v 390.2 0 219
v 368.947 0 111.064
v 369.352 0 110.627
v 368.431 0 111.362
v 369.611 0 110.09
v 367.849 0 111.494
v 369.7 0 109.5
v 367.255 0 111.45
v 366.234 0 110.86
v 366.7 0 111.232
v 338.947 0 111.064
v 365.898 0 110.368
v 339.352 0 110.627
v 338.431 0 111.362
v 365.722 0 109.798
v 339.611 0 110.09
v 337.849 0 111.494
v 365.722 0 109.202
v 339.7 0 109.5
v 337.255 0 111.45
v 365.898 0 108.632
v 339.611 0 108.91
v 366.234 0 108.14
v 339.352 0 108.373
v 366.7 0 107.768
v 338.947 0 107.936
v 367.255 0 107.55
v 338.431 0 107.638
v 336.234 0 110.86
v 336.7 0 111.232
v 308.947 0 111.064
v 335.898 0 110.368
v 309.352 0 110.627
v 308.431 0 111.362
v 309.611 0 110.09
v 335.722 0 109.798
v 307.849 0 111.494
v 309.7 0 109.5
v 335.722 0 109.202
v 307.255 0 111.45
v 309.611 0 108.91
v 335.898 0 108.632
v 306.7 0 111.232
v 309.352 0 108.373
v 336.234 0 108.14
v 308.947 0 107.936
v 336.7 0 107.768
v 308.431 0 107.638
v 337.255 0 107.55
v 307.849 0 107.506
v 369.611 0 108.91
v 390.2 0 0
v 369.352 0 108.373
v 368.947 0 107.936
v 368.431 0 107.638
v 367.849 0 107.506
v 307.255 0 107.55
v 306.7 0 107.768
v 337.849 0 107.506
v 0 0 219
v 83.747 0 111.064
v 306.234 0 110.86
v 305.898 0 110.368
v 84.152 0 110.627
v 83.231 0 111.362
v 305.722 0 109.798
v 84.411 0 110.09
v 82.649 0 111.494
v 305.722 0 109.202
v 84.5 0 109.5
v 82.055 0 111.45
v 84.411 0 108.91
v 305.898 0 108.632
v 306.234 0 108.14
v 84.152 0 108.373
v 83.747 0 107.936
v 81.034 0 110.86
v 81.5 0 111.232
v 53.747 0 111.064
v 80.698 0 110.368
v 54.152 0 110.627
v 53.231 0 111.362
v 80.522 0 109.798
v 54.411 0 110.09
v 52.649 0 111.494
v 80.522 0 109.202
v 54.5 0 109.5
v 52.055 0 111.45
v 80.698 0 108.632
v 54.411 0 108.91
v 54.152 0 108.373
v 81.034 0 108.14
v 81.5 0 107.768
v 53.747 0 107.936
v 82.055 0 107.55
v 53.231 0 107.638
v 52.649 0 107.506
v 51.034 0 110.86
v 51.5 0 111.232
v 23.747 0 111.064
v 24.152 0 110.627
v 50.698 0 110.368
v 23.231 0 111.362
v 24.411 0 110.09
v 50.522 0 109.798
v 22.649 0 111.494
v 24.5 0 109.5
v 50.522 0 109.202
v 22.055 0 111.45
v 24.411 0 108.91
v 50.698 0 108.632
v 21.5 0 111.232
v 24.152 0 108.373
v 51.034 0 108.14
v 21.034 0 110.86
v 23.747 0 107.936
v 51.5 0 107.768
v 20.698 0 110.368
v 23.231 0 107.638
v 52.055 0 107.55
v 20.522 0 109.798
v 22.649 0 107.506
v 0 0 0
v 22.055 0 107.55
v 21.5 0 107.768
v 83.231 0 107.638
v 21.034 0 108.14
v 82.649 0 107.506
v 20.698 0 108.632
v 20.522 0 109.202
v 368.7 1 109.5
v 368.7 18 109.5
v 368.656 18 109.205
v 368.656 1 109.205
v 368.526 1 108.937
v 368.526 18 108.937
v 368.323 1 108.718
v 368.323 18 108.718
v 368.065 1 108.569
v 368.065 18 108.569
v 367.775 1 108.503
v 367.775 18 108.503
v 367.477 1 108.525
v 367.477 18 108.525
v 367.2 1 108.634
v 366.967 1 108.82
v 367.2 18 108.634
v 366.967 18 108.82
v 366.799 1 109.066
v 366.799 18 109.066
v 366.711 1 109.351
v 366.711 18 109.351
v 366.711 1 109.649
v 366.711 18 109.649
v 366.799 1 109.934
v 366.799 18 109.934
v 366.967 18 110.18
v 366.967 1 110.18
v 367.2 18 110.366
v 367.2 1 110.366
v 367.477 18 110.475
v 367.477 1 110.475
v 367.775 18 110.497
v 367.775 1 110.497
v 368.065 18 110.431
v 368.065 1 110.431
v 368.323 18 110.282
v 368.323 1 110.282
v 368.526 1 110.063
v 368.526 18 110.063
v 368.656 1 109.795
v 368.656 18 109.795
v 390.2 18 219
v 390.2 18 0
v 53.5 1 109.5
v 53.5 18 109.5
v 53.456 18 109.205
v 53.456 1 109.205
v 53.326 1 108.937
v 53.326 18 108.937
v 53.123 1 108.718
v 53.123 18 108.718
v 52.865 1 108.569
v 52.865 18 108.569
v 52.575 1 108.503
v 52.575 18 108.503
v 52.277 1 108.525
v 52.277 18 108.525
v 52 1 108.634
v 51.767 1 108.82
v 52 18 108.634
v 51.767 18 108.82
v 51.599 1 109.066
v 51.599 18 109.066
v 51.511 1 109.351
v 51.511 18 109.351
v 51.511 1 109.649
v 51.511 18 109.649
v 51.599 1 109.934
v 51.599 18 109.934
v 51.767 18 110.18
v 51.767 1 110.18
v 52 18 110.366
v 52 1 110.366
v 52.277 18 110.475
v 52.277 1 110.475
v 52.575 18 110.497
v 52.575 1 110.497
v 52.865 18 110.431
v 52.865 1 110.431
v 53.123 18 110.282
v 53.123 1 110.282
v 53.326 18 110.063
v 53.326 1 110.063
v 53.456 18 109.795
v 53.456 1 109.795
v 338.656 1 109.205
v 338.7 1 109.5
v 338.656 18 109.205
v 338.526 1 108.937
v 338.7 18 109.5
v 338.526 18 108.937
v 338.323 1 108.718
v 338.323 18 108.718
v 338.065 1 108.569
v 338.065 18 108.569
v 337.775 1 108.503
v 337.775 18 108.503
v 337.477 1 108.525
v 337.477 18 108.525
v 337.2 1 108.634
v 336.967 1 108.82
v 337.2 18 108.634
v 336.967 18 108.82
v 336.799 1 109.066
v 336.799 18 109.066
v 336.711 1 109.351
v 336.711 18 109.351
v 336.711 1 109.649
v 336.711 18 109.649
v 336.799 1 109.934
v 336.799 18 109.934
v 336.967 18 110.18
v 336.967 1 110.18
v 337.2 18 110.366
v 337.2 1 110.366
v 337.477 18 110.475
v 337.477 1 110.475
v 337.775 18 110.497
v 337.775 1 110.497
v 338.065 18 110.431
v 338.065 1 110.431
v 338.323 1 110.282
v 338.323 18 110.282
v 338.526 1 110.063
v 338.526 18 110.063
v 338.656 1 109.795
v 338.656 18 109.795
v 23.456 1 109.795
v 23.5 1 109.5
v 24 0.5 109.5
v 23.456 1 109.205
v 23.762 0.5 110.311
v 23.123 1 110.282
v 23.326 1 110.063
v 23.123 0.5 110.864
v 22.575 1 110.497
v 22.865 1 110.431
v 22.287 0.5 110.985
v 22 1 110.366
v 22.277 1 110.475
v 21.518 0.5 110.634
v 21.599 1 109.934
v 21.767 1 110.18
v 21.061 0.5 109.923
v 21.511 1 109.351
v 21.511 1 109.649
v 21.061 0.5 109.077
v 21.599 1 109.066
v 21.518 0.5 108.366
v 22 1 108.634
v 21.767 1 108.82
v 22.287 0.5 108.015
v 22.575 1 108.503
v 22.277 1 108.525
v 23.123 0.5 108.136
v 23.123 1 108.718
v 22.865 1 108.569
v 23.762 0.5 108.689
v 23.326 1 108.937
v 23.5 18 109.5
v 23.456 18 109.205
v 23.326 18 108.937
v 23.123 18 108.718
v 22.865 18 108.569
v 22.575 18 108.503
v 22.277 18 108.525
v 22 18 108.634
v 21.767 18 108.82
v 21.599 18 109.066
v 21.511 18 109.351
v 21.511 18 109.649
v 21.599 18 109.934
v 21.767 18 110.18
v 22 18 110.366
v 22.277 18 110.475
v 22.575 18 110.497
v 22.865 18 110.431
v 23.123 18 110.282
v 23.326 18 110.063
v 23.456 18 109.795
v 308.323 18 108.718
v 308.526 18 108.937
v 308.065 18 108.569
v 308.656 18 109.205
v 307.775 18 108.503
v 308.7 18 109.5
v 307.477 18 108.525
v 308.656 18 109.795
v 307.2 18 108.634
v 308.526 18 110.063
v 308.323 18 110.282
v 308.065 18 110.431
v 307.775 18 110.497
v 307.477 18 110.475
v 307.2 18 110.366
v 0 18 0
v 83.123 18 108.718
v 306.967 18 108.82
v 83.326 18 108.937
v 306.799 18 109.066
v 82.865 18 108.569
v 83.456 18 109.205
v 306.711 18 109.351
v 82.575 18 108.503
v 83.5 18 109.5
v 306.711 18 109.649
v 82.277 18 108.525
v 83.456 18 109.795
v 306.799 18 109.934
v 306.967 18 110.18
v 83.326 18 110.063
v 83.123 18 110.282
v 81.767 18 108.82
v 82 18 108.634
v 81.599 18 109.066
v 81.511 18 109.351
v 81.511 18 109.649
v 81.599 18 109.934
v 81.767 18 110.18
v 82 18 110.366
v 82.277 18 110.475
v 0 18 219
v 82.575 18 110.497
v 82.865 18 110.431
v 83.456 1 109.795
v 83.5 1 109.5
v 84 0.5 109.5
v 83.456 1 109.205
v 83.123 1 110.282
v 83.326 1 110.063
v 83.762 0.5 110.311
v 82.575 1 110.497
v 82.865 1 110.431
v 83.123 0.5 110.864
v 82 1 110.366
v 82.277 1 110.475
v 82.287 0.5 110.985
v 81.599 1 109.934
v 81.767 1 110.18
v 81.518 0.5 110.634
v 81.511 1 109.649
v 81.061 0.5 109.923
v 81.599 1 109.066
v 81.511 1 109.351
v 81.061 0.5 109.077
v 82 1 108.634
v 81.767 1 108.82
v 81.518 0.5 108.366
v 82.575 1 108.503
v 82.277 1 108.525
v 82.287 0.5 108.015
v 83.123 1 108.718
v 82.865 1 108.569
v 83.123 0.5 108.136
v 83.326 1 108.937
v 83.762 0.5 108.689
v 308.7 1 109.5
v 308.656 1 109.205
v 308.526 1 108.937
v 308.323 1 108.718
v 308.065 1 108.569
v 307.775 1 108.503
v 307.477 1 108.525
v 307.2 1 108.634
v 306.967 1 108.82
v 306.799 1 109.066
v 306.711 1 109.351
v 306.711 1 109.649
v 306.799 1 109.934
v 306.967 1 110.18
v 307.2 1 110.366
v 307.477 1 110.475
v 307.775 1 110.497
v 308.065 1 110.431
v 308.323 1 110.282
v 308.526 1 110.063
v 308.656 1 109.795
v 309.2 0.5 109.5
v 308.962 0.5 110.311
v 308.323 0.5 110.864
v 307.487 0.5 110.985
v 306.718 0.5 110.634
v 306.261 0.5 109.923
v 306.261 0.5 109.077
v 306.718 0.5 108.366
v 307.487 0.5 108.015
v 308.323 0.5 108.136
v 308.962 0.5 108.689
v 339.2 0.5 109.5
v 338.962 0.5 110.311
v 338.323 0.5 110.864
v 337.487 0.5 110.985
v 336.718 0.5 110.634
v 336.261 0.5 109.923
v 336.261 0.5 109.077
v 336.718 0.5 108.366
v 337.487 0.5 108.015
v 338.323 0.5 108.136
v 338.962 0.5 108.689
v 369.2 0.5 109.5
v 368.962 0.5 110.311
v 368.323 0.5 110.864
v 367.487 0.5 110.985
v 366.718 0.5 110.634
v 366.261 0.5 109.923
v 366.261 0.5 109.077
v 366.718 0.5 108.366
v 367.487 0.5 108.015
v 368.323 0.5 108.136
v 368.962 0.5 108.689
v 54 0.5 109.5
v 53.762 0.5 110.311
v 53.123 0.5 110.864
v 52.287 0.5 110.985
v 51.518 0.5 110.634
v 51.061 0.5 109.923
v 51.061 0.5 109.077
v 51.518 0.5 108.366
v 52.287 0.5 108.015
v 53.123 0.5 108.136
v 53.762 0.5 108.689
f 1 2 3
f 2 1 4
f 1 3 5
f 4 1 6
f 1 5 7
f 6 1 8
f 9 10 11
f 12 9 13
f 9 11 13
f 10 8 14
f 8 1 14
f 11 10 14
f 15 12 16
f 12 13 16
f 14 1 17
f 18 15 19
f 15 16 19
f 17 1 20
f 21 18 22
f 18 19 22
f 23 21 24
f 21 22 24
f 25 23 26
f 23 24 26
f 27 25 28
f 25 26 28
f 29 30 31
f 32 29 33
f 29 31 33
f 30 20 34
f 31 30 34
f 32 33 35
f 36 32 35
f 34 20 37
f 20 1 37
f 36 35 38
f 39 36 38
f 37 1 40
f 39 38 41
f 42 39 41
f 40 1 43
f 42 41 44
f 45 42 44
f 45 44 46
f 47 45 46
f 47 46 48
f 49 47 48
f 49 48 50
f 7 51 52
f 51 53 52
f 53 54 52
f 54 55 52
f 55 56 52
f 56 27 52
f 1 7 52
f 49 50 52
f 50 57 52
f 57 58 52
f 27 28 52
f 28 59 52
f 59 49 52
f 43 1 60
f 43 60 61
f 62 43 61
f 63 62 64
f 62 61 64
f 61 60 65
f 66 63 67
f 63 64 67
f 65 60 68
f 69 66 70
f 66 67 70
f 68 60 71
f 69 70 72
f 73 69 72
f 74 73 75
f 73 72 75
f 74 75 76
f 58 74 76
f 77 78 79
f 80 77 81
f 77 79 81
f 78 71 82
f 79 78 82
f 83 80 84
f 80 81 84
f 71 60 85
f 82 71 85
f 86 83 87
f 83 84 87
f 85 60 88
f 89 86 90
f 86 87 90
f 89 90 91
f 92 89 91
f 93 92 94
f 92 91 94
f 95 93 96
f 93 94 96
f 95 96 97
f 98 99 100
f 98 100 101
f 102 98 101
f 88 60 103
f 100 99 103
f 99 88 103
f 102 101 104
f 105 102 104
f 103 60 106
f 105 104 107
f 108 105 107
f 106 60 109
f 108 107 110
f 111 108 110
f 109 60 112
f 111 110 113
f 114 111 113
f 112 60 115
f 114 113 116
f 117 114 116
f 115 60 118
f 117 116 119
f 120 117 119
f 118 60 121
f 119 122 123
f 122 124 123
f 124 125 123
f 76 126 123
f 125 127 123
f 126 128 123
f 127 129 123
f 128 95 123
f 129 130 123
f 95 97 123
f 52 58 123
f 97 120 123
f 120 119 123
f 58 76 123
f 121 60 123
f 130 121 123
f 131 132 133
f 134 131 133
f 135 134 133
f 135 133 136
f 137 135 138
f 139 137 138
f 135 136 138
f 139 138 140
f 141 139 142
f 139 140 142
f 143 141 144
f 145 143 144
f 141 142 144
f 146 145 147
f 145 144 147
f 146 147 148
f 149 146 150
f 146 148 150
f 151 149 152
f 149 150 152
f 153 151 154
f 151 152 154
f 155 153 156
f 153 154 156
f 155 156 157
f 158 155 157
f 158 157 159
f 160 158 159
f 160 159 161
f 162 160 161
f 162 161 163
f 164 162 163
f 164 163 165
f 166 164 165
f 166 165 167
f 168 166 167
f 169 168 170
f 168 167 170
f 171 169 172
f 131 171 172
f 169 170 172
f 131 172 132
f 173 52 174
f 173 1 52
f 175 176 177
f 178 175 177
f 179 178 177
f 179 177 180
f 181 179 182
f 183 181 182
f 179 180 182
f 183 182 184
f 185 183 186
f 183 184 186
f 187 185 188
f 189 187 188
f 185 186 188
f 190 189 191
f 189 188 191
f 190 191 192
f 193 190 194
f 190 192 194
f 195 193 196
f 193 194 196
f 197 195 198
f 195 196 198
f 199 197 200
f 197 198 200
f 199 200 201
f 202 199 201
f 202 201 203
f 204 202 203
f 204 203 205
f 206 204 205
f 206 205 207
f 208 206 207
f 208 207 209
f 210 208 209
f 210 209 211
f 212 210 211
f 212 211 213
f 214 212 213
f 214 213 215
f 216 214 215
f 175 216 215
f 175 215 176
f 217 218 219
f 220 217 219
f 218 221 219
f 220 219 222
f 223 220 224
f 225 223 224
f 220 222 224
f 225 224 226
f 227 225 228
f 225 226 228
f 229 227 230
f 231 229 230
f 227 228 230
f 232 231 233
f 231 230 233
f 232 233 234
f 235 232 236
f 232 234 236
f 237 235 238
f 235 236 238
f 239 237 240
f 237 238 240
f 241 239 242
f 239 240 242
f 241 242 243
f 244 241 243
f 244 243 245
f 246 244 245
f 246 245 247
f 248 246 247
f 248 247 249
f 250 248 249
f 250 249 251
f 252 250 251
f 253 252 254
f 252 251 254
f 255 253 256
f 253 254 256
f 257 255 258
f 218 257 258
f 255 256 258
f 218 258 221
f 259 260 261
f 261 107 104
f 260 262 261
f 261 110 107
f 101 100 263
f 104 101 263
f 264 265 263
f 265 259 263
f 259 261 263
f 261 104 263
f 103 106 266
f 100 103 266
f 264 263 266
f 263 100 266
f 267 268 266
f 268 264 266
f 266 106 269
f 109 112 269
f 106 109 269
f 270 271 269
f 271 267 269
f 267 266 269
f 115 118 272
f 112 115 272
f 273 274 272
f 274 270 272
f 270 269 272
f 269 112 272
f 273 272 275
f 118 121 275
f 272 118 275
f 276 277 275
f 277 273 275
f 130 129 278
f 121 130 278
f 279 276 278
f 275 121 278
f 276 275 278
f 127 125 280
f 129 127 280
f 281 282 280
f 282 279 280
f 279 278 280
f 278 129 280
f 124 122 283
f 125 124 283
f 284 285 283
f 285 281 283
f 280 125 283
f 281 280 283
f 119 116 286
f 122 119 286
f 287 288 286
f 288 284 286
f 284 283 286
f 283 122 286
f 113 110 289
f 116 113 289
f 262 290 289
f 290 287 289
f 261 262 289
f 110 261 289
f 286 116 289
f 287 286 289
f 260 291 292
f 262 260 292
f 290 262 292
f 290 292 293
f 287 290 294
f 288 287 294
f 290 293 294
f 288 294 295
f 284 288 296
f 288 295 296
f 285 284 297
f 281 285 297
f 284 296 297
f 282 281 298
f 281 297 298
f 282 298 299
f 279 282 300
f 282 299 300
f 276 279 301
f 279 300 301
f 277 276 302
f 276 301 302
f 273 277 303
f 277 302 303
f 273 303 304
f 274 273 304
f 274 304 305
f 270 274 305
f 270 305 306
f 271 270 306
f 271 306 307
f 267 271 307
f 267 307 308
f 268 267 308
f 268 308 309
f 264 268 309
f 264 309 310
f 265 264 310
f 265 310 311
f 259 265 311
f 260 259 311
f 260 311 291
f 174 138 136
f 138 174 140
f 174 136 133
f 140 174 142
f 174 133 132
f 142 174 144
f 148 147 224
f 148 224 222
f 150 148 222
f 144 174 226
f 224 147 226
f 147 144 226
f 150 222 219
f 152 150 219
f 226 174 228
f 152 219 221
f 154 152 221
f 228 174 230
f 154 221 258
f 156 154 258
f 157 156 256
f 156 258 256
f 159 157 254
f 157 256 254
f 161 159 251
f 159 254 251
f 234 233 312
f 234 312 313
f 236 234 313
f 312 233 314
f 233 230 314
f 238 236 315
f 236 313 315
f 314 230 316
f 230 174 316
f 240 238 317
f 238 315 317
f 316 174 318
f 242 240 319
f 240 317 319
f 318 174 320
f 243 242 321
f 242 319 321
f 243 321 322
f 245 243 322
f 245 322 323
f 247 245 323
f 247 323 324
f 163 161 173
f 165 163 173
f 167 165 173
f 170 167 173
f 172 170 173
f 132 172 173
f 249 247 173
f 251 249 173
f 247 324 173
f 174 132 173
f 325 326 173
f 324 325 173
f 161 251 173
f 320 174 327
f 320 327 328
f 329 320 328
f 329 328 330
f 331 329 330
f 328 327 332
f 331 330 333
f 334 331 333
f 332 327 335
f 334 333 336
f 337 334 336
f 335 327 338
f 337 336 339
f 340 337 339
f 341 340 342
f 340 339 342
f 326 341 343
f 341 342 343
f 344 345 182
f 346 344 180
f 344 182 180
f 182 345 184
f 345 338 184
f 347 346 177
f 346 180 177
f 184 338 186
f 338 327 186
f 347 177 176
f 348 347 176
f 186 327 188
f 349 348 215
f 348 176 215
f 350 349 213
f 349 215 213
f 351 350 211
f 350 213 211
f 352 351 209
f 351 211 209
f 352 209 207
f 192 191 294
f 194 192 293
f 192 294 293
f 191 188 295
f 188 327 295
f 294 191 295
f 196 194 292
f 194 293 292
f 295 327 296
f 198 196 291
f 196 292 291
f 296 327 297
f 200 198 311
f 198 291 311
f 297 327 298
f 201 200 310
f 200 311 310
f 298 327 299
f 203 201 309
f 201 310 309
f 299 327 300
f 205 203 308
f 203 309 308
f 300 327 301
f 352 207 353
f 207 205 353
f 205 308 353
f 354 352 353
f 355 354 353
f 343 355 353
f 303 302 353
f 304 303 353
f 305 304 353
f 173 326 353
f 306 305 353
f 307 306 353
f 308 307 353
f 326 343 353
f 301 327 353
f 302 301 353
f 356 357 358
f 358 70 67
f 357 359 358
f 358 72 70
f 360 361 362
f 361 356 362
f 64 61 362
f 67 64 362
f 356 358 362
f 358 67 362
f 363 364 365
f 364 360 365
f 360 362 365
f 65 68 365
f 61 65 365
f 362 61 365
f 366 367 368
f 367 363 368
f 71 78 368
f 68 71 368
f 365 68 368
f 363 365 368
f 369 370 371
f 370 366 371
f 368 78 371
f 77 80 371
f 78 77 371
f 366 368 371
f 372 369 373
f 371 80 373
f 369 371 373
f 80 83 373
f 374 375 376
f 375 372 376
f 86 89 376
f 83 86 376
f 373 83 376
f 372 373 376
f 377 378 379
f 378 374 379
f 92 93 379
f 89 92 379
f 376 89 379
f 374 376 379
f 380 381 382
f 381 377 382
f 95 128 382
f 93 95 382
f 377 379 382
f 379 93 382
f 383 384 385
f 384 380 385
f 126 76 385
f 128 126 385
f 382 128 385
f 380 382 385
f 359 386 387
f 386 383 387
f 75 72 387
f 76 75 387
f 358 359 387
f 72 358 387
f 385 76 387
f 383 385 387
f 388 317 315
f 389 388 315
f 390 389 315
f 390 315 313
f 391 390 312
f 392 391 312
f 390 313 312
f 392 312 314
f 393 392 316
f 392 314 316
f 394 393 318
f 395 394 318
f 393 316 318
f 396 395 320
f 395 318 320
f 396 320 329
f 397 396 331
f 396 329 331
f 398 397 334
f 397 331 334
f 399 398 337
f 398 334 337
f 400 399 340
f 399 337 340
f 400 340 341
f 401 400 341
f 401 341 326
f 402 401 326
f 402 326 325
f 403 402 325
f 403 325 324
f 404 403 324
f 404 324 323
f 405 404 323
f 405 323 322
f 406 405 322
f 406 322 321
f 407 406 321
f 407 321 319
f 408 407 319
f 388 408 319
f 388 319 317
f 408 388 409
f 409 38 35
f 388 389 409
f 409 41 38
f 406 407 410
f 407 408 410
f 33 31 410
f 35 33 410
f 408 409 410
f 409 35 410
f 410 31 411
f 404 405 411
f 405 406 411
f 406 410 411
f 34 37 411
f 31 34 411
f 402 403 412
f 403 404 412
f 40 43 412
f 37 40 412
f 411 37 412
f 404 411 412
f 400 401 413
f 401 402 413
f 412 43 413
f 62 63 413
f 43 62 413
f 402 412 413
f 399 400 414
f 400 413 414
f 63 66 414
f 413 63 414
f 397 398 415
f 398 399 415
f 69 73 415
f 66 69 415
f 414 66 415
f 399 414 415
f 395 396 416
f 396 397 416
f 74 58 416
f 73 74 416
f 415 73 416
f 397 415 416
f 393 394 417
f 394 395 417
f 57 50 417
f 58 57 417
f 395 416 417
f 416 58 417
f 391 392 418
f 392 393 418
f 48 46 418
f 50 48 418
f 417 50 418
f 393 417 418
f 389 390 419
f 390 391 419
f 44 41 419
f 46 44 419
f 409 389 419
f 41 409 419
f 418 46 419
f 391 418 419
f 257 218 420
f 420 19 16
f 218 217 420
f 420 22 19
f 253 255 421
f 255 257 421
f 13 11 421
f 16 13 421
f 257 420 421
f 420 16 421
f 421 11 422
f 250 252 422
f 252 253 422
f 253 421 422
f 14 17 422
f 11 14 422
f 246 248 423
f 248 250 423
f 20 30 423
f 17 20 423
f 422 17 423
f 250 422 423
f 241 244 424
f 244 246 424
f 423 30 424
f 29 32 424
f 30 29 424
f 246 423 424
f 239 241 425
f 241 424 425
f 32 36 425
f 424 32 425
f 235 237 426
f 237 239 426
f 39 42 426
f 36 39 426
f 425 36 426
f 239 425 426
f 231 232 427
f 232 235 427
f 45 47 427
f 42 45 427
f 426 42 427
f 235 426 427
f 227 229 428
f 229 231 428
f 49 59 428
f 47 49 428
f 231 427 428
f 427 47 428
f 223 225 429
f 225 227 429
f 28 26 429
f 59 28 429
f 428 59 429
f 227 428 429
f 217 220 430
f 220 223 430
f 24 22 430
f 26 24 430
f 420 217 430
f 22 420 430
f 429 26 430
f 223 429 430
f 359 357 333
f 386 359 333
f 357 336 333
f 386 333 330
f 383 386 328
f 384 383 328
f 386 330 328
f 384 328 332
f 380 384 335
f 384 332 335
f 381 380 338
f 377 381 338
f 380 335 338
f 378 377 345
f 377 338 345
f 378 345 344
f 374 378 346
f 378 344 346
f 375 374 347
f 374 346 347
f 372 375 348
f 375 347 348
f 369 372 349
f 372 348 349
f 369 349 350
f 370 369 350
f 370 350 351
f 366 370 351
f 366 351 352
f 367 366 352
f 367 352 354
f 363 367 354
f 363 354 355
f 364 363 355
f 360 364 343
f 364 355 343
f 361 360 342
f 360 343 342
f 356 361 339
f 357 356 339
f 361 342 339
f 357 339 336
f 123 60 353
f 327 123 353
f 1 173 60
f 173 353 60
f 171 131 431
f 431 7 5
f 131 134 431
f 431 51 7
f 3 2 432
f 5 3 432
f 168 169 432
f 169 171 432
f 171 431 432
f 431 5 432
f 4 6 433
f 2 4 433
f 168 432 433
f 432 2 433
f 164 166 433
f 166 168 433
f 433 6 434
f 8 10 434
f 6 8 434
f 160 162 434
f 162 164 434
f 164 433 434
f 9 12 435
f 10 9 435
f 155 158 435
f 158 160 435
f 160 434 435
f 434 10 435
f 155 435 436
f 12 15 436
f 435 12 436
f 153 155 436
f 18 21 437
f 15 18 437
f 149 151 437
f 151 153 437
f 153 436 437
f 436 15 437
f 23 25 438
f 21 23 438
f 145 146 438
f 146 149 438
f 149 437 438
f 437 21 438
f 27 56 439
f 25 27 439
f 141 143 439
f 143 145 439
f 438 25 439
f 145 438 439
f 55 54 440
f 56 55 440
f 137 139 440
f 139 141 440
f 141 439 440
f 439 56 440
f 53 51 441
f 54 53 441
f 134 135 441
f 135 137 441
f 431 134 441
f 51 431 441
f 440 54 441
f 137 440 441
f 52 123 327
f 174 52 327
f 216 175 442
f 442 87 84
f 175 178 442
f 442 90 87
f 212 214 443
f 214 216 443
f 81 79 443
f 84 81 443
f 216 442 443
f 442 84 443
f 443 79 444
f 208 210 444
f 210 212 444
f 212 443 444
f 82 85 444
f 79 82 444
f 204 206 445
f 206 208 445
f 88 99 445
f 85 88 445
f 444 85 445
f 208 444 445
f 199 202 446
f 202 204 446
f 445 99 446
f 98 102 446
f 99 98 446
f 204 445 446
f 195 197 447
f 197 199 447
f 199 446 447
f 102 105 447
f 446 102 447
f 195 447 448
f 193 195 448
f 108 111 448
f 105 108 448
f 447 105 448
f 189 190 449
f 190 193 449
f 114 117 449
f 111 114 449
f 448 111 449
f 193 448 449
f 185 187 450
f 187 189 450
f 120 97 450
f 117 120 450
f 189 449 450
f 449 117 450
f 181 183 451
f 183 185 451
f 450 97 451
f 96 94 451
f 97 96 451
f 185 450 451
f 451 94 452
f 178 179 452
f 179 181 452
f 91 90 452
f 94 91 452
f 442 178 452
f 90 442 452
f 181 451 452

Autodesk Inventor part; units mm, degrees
ref_plane "YZ Plane" through (0, 0, 0) normal (1, 0, 0) x (0, 1, 0)
ref_plane "XZ Plane" through (0, 0, 0) normal (0, 1, 0) x (-1, 0, 0)
ref_plane "XY Plane" through (0, 0, 0) normal (0, 0, 1) x (1, 0, 0)
sketch "Sketch2" plane through (0, 0, 0) normal (1, 0, 0) x (0, 1, 0)
  line L0 (0, 0) -> (18, 0)
  line L1 (18, 0) -> (18, 219)
  line L2 (18, 219) -> (0, 219)
  line L3 (0, 219) -> (0, 0)
  dimension "d2" = 18
  dimension "d3" = 219
extrude "Extrusion1" add sketch "Sketch2" along normal blind 390.2
sketch "Sketch3" plane through (0, 18, 219) normal (0, 1, 0) x (1, 0, 0)
  line L0 (0, 118.5) -> (105, 118.5) construction
  line L1 (105, 118.5) -> (105, 100.5) construction
  line L2 (105, 100.5) -> (0, 100.5) construction
  line L3 (0, 100.5) -> (0, 118.5) construction
  circle A0 centre (22.5, 109.5) radius 1
  circle A1 centre (52.5, 109.5) radius 1
  circle A2 centre (82.5, 109.5) radius 1
  line L4 (0, 219) -> (0, 0) construction
  line L5 (0, 0) -> (390.2, 0) construction
  line L6 (195.1, 92.3564) -> (195.1, 74.6575) construction
  line L7 (390.2, 118.5) -> (285.2, 118.5) construction
  line L8 (285.2, 118.5) -> (285.2, 100.5) construction
  line L9 (285.2, 100.5) -> (390.2, 100.5) construction
  line L10 (390.2, 100.5) -> (390.2, 118.5) construction
  circle A3 centre (367.7, 109.5) radius 1
  circle A4 centre (337.7, 109.5) radius 1
  circle A5 centre (307.7, 109.5) radius 1
  line L11 (10, 90.5) -> (380.2, 90.5)
  line L12 (380.2, 90.5) -> (380.2, 10)
  line L13 (380.2, 10) -> (10, 10)
  line L14 (10, 10) -> (10, 90.5)
  line L15 (390.2, 219) -> (390.2, 0) projected
  point P0 (52.5, 100.5)
  point P1 (0, 109.5)
  point P2 (0, 109.5)
  point P3 (337.7, 100.5)
  point P4 (390.2, 109.5)
  dimension "d6" = 105
  dimension "d10" = 30
  dimension "d15" = 18
  dimension "screwholediameter" = 2
  dimension "d17" = 90.1
  dimension "d18" = 0
  dimension "d19" = 390.2
  dimension "d22" = 370.2
  dimension "d23" = 80.5
  dimension "d24" = 10
  dimension "d25" = 10
  dimension "d26" = 10
  dimension "d27" = 10
extrude "Extrusion2" cut sketch "Sketch3" against normal through all contours A0 | A1 | A2 | A3 | A4 | A5
chamfer "Chamfer1" distance 1 angle 45 6 edges at (21.5, 0, 109.5) (51.5, 0, 109.5) (81.5, 0, 109.5) (306.7, 0, 109.5) (336.7, 0, 109.5) (366.7, 0, 109.5)
properties part number "SGB-8-platform"
